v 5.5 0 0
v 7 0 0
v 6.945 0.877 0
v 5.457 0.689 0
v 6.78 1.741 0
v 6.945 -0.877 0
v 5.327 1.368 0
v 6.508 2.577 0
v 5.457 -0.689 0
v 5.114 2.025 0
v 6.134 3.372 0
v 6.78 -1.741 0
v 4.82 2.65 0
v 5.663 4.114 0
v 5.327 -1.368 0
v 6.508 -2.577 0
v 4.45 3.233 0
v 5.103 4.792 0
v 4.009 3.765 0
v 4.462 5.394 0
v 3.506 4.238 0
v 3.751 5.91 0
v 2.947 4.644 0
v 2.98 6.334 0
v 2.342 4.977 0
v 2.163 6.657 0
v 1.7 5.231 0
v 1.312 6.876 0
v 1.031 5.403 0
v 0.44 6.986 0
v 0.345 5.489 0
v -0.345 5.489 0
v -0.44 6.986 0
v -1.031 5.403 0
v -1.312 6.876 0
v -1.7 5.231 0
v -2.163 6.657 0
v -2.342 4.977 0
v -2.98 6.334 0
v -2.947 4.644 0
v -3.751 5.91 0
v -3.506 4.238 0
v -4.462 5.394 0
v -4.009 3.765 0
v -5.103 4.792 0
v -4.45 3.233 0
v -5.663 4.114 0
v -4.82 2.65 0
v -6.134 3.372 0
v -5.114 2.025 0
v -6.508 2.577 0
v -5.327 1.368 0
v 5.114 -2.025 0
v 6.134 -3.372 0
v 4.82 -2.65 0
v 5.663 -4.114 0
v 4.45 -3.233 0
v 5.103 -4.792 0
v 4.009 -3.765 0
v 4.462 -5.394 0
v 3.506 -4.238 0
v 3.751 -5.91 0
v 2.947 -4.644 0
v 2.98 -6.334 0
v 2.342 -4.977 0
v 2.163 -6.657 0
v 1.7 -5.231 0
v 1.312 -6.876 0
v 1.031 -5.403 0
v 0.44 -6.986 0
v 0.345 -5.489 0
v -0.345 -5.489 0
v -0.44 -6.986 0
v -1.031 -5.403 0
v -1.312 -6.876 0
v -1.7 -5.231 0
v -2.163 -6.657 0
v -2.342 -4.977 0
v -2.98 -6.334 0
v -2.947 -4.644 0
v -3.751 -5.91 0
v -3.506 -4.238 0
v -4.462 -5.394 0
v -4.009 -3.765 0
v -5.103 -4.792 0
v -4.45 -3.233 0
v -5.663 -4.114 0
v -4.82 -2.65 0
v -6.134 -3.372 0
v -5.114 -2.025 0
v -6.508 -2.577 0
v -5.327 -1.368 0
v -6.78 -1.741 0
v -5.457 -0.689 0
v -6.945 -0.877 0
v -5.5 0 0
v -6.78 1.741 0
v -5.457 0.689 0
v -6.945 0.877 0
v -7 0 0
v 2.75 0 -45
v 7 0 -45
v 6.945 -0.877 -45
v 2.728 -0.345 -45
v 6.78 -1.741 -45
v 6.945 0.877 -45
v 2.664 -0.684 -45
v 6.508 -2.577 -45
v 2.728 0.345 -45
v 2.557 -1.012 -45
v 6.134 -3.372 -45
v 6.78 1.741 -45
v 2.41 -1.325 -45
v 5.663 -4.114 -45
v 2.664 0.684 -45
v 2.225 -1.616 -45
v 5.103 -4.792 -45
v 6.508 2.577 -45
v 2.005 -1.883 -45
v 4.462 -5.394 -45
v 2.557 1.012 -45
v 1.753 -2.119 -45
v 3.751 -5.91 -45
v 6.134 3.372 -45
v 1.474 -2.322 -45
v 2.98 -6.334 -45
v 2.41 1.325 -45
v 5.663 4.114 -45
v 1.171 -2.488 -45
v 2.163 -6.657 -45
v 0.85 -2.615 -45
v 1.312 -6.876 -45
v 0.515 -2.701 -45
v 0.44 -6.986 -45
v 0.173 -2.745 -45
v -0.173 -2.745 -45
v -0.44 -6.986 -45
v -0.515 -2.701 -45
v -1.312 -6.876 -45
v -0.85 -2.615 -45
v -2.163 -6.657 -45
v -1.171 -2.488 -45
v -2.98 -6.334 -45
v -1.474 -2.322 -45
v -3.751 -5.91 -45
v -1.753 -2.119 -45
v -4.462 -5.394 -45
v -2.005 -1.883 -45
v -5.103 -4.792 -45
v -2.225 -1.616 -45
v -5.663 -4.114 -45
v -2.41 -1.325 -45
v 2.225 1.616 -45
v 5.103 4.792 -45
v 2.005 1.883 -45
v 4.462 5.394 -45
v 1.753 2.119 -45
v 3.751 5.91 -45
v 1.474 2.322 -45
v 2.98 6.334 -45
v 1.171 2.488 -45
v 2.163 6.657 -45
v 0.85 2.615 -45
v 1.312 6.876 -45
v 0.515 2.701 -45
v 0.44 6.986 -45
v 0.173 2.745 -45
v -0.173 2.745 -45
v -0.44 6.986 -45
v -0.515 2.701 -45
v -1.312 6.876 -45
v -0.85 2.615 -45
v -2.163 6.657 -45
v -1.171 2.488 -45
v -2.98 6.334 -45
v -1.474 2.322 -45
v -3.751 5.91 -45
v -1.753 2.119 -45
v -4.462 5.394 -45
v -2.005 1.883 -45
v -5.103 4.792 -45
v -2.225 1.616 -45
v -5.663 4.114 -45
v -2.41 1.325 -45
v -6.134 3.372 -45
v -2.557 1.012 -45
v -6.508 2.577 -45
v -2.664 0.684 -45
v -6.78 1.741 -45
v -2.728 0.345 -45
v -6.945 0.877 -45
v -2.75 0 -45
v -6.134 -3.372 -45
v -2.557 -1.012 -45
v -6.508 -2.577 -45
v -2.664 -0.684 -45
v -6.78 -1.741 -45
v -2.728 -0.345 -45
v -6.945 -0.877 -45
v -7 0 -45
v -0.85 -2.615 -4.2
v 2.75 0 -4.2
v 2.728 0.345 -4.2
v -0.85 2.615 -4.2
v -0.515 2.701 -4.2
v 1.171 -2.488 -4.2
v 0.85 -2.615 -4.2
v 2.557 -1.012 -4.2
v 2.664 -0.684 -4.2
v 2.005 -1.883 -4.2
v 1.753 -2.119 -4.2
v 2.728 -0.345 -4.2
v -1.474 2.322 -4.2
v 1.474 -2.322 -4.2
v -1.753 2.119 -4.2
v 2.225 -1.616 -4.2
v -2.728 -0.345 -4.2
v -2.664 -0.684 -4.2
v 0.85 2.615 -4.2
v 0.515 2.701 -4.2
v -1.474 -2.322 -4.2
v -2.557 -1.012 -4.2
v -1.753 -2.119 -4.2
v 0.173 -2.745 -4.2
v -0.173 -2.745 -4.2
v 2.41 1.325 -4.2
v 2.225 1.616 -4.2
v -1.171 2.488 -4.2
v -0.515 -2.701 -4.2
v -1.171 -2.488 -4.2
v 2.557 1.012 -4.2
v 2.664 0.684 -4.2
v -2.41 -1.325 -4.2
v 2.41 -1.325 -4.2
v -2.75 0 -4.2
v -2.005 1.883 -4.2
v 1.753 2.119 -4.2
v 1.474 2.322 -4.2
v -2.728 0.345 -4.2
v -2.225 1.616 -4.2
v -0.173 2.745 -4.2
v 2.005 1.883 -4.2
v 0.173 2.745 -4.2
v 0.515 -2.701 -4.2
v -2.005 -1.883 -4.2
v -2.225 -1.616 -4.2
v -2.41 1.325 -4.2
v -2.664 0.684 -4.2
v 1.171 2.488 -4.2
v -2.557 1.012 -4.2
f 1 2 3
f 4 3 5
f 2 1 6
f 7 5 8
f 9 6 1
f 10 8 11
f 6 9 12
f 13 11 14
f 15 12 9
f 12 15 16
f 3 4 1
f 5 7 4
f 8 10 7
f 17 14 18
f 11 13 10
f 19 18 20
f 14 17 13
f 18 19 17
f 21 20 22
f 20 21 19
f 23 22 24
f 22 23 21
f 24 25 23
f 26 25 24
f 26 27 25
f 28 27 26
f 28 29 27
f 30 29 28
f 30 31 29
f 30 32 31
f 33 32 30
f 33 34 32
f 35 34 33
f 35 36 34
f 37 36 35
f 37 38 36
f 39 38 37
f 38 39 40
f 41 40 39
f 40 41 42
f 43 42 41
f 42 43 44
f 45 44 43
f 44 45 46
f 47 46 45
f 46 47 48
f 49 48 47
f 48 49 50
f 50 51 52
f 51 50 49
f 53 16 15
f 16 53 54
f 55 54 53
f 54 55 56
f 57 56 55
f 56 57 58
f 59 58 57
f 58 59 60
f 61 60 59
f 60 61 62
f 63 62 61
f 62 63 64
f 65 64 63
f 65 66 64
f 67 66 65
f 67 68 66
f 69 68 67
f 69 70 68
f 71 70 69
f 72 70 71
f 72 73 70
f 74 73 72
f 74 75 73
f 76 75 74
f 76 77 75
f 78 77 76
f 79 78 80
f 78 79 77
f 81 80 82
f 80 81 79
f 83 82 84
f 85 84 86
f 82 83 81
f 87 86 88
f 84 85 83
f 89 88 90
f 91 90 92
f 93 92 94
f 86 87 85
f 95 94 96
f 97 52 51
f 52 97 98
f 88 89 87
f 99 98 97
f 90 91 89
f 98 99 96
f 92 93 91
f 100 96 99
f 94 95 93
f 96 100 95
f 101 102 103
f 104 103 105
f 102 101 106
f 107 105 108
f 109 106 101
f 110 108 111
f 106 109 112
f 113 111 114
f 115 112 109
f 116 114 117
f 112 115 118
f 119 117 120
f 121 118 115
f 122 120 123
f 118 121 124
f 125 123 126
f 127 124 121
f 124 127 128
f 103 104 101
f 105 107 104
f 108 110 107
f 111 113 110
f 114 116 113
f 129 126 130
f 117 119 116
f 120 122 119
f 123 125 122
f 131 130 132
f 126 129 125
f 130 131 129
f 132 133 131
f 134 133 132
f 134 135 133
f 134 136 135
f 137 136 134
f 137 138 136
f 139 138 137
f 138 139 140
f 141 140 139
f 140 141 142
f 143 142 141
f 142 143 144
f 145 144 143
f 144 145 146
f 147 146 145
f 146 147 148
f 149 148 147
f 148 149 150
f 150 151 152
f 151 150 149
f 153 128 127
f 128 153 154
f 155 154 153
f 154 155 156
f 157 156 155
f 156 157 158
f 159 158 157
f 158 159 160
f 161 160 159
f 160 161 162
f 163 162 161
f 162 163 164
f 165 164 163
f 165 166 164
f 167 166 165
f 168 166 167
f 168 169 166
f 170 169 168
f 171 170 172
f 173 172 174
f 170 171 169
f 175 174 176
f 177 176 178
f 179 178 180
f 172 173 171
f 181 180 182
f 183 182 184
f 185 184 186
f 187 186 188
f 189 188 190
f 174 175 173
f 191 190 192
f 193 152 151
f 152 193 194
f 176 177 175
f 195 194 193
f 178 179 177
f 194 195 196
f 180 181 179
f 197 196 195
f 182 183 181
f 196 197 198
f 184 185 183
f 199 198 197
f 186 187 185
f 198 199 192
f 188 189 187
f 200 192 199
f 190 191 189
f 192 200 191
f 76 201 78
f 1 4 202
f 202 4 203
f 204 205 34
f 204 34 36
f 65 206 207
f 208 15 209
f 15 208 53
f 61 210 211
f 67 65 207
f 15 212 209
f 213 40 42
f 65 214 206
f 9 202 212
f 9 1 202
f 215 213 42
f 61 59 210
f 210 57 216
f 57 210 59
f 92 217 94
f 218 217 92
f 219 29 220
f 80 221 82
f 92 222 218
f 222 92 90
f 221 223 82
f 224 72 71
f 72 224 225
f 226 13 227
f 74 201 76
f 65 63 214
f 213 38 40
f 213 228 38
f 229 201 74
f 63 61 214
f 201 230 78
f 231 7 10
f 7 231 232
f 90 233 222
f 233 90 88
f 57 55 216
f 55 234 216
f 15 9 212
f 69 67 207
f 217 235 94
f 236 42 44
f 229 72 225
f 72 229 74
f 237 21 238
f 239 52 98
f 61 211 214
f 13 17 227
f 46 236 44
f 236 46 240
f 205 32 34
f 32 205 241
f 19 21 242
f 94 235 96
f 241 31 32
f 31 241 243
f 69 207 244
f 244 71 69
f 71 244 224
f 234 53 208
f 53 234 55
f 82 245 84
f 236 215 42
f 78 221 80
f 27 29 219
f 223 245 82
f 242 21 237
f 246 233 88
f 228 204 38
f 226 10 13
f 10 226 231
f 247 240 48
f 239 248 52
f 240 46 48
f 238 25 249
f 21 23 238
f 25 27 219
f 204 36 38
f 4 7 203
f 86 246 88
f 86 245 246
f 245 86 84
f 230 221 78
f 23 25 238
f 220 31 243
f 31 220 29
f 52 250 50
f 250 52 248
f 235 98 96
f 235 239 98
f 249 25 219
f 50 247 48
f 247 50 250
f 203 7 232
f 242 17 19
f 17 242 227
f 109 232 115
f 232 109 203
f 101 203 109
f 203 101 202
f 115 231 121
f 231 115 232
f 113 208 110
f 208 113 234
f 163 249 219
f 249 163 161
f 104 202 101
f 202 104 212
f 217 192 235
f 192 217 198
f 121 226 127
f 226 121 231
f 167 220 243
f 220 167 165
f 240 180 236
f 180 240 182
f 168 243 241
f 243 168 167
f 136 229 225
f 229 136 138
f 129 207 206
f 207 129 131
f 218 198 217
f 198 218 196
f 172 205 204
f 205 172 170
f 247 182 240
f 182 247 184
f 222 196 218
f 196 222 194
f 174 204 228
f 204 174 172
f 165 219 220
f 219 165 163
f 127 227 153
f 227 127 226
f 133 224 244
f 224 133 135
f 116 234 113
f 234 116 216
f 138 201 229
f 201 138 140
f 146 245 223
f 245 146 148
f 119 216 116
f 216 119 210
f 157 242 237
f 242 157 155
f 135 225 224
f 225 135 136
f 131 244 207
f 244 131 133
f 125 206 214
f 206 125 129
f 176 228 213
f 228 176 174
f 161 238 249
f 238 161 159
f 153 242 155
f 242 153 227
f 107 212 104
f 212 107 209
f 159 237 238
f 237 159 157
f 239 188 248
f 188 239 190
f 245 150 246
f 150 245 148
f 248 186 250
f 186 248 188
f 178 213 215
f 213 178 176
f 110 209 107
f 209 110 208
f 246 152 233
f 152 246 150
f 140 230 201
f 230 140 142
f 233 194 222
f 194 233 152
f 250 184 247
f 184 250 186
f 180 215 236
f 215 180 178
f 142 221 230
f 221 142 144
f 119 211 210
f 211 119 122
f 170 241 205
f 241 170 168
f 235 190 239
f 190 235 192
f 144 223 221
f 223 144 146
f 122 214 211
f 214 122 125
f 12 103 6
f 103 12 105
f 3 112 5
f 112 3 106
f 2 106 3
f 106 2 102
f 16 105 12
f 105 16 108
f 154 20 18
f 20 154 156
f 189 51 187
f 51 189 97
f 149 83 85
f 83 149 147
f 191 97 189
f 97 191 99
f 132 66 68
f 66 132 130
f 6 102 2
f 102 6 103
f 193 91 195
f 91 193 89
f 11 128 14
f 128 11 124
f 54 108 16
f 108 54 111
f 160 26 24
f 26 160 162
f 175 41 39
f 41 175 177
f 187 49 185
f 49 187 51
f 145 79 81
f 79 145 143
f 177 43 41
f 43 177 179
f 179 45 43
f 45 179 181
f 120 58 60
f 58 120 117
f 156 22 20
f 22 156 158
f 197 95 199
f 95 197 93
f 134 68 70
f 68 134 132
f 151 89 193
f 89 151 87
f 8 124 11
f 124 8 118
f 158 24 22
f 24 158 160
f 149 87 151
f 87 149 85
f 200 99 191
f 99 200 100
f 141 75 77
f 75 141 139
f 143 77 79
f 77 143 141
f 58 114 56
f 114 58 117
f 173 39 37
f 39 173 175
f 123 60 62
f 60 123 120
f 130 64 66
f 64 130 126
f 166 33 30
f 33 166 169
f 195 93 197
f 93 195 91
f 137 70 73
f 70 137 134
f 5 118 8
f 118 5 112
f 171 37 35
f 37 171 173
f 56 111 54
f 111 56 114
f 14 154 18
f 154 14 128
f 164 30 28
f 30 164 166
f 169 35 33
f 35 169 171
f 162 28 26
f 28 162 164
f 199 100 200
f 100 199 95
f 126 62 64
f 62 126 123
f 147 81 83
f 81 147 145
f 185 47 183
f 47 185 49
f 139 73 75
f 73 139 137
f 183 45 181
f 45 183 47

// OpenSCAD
$fn = 50;


difference() {
	union() {
		translate(v = [0, 0, -45.0000000000]) {
			cylinder(h = 45, r = 7.0000000000);
		}
	}
	union() {
		translate(v = [0, 0, 0]) {
			rotate(a = [0, 0, 0]) {
				difference() {
					union() {
						#translate(v = [0, 0, -45.0000000000]) {
							cylinder(h = 45, r = 2.2500000000);
						}
						#translate(v = [0, 0, -4.2000000000]) {
							cylinder(h = 4.2000000000, r1 = 2.7500000000, r2 = 5.5000000000);
						}
						#translate(v = [0, 0, -45.0000000000]) {
							cylinder(h = 45, r = 2.7500000000);
						}
						#translate(v = [0, 0, -45.0000000000]) {
							cylinder(h = 45, r = 2.2500000000);
						}
					}
					union();
				}
			}
		}
	}
}
